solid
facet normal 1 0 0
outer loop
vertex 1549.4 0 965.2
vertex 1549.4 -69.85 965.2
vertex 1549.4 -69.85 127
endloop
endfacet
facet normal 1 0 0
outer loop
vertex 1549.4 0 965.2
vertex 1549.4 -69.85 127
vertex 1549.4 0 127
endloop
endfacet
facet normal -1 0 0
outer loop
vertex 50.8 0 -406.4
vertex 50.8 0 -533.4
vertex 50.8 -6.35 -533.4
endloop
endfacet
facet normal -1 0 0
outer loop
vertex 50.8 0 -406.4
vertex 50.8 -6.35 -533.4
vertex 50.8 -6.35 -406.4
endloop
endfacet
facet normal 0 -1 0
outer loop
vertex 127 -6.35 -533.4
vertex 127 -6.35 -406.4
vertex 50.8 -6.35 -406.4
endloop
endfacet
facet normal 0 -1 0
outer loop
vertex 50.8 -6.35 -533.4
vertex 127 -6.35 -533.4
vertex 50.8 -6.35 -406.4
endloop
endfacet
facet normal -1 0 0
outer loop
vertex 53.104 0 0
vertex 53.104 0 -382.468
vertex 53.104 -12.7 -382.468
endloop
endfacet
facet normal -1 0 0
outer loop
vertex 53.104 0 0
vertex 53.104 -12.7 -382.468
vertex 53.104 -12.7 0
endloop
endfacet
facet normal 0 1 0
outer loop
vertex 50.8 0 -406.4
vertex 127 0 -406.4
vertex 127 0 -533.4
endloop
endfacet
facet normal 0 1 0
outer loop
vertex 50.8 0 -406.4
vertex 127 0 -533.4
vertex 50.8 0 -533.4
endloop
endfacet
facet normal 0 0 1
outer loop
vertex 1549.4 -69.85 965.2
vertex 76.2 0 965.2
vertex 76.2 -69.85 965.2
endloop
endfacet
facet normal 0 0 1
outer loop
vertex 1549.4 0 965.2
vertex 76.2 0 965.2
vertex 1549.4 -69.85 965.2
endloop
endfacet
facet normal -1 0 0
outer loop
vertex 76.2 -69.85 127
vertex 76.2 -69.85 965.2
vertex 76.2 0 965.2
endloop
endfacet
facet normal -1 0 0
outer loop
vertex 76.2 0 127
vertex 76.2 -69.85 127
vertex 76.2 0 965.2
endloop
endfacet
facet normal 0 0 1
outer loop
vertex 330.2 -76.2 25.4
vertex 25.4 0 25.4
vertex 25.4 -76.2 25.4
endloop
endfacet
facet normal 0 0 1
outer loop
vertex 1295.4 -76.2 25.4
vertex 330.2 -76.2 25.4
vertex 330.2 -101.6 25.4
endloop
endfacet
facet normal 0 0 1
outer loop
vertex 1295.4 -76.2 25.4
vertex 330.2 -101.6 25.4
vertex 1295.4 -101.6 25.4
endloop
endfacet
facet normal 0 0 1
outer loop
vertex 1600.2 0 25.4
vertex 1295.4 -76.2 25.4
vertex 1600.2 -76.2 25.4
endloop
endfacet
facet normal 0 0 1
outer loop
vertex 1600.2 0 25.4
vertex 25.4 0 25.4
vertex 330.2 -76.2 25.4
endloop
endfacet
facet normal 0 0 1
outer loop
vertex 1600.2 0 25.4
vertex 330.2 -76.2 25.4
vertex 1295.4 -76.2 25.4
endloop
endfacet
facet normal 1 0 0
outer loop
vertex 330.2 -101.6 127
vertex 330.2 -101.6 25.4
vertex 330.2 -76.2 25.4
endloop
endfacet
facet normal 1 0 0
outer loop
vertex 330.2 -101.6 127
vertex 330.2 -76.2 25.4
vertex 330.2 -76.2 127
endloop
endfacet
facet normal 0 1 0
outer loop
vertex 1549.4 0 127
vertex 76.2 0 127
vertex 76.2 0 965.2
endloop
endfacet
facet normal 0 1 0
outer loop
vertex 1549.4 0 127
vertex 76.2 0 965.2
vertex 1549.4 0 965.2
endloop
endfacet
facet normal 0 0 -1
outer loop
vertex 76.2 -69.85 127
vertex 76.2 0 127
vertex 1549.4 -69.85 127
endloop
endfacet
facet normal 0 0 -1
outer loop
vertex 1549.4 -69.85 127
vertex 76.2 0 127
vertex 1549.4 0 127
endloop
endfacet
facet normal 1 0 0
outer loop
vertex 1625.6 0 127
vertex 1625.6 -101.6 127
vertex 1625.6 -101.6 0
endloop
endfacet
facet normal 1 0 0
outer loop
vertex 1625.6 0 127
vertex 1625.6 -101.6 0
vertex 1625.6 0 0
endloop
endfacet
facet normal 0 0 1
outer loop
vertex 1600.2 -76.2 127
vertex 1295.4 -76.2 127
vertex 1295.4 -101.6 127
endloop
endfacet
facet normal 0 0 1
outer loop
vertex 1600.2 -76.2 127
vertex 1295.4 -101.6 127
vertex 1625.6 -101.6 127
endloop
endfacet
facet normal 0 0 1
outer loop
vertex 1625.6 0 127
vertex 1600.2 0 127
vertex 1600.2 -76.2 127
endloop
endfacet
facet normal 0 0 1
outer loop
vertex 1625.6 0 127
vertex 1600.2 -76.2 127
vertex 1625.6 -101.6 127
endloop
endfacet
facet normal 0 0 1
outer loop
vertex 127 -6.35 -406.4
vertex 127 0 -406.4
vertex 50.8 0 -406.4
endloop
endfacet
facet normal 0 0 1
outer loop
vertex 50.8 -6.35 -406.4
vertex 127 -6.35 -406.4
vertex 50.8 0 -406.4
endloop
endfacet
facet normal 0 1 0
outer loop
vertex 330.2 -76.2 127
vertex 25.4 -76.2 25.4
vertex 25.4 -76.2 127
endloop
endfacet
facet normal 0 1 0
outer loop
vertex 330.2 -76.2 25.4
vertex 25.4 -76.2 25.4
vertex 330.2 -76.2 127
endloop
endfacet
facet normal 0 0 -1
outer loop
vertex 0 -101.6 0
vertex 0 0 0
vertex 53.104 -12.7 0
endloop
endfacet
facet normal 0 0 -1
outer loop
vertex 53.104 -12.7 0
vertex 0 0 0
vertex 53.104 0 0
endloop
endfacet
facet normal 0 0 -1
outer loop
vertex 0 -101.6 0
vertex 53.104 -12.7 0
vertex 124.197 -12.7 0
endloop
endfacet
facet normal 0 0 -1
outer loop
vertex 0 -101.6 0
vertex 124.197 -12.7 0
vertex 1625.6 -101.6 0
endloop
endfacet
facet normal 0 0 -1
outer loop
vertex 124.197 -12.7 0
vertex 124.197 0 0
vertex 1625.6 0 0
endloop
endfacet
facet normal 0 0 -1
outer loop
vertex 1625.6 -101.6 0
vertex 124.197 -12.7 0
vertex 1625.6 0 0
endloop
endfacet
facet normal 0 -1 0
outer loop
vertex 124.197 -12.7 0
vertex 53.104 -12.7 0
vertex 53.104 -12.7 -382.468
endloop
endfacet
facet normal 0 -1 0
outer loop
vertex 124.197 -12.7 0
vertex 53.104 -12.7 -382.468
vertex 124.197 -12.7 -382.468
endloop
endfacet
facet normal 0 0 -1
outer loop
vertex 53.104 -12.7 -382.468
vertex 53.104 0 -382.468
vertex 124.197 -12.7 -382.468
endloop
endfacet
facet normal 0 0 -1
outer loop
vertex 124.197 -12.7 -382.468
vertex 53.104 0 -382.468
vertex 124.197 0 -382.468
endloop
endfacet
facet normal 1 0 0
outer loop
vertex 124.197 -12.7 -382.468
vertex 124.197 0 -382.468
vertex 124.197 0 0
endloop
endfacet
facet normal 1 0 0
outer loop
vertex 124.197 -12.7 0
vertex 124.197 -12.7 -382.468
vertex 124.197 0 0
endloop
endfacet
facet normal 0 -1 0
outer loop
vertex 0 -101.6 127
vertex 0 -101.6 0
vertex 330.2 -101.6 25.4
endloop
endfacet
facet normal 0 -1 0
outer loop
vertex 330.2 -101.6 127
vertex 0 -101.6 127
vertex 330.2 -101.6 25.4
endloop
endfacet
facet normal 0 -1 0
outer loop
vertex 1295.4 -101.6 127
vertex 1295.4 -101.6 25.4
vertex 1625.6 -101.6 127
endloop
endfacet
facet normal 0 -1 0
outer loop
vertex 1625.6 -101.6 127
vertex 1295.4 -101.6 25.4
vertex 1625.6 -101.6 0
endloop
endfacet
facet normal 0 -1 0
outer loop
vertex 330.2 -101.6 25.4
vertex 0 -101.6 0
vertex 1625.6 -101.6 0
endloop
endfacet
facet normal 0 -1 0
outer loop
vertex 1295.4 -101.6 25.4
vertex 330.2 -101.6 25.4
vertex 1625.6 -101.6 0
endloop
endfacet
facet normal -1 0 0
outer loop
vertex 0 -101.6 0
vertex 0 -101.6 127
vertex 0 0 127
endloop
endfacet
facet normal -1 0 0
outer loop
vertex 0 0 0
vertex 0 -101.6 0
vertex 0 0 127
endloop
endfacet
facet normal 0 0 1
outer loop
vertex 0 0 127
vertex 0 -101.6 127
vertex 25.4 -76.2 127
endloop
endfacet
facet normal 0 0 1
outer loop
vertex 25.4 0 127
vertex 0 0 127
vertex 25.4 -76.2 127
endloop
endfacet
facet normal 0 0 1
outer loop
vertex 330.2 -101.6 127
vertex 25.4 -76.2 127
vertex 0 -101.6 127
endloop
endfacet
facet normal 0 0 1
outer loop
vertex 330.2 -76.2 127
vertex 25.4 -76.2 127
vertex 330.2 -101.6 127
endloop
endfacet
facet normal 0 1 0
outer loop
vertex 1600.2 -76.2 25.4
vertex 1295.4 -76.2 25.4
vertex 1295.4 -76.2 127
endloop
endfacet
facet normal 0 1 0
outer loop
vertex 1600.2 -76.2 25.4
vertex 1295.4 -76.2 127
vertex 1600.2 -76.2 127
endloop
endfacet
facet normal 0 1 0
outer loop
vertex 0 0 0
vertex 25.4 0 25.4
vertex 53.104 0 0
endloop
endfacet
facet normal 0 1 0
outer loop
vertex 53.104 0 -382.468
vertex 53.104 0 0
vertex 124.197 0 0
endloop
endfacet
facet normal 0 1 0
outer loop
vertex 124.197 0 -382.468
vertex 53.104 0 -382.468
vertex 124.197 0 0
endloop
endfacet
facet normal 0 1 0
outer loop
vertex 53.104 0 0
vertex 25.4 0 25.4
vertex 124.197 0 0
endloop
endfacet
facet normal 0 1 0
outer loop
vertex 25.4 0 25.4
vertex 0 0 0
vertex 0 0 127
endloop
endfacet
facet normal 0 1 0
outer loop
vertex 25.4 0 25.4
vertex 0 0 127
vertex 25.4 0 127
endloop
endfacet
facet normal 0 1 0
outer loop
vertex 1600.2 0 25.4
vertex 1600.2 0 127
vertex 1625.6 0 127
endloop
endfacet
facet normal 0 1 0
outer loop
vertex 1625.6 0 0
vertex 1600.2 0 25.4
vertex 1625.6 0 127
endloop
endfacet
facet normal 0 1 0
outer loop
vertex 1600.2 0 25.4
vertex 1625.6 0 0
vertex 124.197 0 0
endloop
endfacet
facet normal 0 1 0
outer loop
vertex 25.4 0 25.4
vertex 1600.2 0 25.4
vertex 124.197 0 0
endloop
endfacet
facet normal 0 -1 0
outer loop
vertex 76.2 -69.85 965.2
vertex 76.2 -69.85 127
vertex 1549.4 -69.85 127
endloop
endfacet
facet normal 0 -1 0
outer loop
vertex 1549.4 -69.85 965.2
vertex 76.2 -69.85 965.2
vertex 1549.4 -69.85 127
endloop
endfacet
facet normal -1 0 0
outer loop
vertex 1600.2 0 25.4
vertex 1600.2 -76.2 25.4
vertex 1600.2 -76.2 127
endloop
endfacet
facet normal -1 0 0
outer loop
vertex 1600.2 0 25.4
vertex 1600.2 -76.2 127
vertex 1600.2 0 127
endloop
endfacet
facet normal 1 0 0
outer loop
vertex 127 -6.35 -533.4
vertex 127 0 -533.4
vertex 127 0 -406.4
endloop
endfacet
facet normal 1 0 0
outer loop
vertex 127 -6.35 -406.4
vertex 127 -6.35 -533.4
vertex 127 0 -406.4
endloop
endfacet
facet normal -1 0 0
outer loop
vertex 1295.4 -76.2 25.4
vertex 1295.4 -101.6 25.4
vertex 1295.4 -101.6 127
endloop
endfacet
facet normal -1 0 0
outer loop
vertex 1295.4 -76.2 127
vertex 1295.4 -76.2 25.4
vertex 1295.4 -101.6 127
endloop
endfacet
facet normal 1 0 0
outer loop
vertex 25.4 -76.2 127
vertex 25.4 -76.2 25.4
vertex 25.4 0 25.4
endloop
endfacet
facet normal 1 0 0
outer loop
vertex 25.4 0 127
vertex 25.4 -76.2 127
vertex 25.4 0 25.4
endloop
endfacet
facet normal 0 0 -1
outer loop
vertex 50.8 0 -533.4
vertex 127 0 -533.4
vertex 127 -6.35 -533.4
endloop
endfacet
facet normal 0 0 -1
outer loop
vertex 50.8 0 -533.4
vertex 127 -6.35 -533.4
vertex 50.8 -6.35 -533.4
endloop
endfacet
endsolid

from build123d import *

# Parameters (mm, degrees)
F0_W      = 1625.6
F0_H      = 101.6
F1_DEPTH  = 25.4
F2_W      = 1625.6
F2_H      = 25.4
F3_DEPTH  = 101.6
F4_W      = 25.4
F4_H      = 76.2
F5_DEPTH  = 101.6
F6_W      = 965.2
F6_H      = 101.6
F7_DEPTH  = 25.4
F8_W      = 1473.2
F8_H      = 69.85
F9_DEPTH  = 838.2
F10_W     = 76.2
F10_H     = 127
F11_DEPTH = 6.35
F12_W     = 71.093232
F12_H     = 382.467955
F13_DEPTH = 12.7


with BuildPart() as f1:
    # F0 (on Top) → F1 (new body)
    with BuildSketch(Plane.XY):
        with Locations((812.8, -50.8)):
            Rectangle(F0_W, F0_H)
    extrude(amount=F1_DEPTH)

    # F2 (on face) → F3 (join)
    with BuildSketch(Plane.XY.offset(25.4)):
        with Locations((812.8, -88.9)):
            Rectangle(F2_W, F2_H)
    extrude(amount=F3_DEPTH)

    # F4 (on face) → F5 (join)
    with BuildSketch(Plane.XY.offset(25.4)):
        with Locations((12.7, -38.1)):
            Rectangle(F4_W, F4_H)
        with Locations((1612.9, -38.1)):
            Rectangle(F4_W, F4_H)
    extrude(amount=F5_DEPTH)

    # F6 (on face) → F7 (cut)
    with BuildSketch(Plane.XZ.offset(101.6)):
        with Locations((812.8, 76.2)):
            Rectangle(F6_W, F6_H)
    extrude(amount=-F7_DEPTH, mode=Mode.SUBTRACT)

    # F12 (on Front) → F13 (join)
    with BuildSketch(Plane.XZ):
        with Locations((88.650383, -191.233977)):
            Rectangle(F12_W, F12_H)
    extrude(amount=F13_DEPTH)


with BuildPart() as f9:
    # F8 (on face) → F9 (new body)
    with BuildSketch(Plane.XY.offset(127)):
        with Locations((812.8, -34.925)):
            Rectangle(F8_W, F8_H)
    extrude(amount=F9_DEPTH)


with BuildPart() as f11:
    # F10 (on face) → F11 (new body)
    with BuildSketch(Plane(origin=(0, 0, 0), x_dir=(-1, 0, 0), z_dir=(0, 1, 0))):
        with Locations((-88.9, -469.9)):
            Rectangle(F10_W, F10_H)
    extrude(amount=-F11_DEPTH)


solid = Compound([f1.part, f9.part, f11.part])
